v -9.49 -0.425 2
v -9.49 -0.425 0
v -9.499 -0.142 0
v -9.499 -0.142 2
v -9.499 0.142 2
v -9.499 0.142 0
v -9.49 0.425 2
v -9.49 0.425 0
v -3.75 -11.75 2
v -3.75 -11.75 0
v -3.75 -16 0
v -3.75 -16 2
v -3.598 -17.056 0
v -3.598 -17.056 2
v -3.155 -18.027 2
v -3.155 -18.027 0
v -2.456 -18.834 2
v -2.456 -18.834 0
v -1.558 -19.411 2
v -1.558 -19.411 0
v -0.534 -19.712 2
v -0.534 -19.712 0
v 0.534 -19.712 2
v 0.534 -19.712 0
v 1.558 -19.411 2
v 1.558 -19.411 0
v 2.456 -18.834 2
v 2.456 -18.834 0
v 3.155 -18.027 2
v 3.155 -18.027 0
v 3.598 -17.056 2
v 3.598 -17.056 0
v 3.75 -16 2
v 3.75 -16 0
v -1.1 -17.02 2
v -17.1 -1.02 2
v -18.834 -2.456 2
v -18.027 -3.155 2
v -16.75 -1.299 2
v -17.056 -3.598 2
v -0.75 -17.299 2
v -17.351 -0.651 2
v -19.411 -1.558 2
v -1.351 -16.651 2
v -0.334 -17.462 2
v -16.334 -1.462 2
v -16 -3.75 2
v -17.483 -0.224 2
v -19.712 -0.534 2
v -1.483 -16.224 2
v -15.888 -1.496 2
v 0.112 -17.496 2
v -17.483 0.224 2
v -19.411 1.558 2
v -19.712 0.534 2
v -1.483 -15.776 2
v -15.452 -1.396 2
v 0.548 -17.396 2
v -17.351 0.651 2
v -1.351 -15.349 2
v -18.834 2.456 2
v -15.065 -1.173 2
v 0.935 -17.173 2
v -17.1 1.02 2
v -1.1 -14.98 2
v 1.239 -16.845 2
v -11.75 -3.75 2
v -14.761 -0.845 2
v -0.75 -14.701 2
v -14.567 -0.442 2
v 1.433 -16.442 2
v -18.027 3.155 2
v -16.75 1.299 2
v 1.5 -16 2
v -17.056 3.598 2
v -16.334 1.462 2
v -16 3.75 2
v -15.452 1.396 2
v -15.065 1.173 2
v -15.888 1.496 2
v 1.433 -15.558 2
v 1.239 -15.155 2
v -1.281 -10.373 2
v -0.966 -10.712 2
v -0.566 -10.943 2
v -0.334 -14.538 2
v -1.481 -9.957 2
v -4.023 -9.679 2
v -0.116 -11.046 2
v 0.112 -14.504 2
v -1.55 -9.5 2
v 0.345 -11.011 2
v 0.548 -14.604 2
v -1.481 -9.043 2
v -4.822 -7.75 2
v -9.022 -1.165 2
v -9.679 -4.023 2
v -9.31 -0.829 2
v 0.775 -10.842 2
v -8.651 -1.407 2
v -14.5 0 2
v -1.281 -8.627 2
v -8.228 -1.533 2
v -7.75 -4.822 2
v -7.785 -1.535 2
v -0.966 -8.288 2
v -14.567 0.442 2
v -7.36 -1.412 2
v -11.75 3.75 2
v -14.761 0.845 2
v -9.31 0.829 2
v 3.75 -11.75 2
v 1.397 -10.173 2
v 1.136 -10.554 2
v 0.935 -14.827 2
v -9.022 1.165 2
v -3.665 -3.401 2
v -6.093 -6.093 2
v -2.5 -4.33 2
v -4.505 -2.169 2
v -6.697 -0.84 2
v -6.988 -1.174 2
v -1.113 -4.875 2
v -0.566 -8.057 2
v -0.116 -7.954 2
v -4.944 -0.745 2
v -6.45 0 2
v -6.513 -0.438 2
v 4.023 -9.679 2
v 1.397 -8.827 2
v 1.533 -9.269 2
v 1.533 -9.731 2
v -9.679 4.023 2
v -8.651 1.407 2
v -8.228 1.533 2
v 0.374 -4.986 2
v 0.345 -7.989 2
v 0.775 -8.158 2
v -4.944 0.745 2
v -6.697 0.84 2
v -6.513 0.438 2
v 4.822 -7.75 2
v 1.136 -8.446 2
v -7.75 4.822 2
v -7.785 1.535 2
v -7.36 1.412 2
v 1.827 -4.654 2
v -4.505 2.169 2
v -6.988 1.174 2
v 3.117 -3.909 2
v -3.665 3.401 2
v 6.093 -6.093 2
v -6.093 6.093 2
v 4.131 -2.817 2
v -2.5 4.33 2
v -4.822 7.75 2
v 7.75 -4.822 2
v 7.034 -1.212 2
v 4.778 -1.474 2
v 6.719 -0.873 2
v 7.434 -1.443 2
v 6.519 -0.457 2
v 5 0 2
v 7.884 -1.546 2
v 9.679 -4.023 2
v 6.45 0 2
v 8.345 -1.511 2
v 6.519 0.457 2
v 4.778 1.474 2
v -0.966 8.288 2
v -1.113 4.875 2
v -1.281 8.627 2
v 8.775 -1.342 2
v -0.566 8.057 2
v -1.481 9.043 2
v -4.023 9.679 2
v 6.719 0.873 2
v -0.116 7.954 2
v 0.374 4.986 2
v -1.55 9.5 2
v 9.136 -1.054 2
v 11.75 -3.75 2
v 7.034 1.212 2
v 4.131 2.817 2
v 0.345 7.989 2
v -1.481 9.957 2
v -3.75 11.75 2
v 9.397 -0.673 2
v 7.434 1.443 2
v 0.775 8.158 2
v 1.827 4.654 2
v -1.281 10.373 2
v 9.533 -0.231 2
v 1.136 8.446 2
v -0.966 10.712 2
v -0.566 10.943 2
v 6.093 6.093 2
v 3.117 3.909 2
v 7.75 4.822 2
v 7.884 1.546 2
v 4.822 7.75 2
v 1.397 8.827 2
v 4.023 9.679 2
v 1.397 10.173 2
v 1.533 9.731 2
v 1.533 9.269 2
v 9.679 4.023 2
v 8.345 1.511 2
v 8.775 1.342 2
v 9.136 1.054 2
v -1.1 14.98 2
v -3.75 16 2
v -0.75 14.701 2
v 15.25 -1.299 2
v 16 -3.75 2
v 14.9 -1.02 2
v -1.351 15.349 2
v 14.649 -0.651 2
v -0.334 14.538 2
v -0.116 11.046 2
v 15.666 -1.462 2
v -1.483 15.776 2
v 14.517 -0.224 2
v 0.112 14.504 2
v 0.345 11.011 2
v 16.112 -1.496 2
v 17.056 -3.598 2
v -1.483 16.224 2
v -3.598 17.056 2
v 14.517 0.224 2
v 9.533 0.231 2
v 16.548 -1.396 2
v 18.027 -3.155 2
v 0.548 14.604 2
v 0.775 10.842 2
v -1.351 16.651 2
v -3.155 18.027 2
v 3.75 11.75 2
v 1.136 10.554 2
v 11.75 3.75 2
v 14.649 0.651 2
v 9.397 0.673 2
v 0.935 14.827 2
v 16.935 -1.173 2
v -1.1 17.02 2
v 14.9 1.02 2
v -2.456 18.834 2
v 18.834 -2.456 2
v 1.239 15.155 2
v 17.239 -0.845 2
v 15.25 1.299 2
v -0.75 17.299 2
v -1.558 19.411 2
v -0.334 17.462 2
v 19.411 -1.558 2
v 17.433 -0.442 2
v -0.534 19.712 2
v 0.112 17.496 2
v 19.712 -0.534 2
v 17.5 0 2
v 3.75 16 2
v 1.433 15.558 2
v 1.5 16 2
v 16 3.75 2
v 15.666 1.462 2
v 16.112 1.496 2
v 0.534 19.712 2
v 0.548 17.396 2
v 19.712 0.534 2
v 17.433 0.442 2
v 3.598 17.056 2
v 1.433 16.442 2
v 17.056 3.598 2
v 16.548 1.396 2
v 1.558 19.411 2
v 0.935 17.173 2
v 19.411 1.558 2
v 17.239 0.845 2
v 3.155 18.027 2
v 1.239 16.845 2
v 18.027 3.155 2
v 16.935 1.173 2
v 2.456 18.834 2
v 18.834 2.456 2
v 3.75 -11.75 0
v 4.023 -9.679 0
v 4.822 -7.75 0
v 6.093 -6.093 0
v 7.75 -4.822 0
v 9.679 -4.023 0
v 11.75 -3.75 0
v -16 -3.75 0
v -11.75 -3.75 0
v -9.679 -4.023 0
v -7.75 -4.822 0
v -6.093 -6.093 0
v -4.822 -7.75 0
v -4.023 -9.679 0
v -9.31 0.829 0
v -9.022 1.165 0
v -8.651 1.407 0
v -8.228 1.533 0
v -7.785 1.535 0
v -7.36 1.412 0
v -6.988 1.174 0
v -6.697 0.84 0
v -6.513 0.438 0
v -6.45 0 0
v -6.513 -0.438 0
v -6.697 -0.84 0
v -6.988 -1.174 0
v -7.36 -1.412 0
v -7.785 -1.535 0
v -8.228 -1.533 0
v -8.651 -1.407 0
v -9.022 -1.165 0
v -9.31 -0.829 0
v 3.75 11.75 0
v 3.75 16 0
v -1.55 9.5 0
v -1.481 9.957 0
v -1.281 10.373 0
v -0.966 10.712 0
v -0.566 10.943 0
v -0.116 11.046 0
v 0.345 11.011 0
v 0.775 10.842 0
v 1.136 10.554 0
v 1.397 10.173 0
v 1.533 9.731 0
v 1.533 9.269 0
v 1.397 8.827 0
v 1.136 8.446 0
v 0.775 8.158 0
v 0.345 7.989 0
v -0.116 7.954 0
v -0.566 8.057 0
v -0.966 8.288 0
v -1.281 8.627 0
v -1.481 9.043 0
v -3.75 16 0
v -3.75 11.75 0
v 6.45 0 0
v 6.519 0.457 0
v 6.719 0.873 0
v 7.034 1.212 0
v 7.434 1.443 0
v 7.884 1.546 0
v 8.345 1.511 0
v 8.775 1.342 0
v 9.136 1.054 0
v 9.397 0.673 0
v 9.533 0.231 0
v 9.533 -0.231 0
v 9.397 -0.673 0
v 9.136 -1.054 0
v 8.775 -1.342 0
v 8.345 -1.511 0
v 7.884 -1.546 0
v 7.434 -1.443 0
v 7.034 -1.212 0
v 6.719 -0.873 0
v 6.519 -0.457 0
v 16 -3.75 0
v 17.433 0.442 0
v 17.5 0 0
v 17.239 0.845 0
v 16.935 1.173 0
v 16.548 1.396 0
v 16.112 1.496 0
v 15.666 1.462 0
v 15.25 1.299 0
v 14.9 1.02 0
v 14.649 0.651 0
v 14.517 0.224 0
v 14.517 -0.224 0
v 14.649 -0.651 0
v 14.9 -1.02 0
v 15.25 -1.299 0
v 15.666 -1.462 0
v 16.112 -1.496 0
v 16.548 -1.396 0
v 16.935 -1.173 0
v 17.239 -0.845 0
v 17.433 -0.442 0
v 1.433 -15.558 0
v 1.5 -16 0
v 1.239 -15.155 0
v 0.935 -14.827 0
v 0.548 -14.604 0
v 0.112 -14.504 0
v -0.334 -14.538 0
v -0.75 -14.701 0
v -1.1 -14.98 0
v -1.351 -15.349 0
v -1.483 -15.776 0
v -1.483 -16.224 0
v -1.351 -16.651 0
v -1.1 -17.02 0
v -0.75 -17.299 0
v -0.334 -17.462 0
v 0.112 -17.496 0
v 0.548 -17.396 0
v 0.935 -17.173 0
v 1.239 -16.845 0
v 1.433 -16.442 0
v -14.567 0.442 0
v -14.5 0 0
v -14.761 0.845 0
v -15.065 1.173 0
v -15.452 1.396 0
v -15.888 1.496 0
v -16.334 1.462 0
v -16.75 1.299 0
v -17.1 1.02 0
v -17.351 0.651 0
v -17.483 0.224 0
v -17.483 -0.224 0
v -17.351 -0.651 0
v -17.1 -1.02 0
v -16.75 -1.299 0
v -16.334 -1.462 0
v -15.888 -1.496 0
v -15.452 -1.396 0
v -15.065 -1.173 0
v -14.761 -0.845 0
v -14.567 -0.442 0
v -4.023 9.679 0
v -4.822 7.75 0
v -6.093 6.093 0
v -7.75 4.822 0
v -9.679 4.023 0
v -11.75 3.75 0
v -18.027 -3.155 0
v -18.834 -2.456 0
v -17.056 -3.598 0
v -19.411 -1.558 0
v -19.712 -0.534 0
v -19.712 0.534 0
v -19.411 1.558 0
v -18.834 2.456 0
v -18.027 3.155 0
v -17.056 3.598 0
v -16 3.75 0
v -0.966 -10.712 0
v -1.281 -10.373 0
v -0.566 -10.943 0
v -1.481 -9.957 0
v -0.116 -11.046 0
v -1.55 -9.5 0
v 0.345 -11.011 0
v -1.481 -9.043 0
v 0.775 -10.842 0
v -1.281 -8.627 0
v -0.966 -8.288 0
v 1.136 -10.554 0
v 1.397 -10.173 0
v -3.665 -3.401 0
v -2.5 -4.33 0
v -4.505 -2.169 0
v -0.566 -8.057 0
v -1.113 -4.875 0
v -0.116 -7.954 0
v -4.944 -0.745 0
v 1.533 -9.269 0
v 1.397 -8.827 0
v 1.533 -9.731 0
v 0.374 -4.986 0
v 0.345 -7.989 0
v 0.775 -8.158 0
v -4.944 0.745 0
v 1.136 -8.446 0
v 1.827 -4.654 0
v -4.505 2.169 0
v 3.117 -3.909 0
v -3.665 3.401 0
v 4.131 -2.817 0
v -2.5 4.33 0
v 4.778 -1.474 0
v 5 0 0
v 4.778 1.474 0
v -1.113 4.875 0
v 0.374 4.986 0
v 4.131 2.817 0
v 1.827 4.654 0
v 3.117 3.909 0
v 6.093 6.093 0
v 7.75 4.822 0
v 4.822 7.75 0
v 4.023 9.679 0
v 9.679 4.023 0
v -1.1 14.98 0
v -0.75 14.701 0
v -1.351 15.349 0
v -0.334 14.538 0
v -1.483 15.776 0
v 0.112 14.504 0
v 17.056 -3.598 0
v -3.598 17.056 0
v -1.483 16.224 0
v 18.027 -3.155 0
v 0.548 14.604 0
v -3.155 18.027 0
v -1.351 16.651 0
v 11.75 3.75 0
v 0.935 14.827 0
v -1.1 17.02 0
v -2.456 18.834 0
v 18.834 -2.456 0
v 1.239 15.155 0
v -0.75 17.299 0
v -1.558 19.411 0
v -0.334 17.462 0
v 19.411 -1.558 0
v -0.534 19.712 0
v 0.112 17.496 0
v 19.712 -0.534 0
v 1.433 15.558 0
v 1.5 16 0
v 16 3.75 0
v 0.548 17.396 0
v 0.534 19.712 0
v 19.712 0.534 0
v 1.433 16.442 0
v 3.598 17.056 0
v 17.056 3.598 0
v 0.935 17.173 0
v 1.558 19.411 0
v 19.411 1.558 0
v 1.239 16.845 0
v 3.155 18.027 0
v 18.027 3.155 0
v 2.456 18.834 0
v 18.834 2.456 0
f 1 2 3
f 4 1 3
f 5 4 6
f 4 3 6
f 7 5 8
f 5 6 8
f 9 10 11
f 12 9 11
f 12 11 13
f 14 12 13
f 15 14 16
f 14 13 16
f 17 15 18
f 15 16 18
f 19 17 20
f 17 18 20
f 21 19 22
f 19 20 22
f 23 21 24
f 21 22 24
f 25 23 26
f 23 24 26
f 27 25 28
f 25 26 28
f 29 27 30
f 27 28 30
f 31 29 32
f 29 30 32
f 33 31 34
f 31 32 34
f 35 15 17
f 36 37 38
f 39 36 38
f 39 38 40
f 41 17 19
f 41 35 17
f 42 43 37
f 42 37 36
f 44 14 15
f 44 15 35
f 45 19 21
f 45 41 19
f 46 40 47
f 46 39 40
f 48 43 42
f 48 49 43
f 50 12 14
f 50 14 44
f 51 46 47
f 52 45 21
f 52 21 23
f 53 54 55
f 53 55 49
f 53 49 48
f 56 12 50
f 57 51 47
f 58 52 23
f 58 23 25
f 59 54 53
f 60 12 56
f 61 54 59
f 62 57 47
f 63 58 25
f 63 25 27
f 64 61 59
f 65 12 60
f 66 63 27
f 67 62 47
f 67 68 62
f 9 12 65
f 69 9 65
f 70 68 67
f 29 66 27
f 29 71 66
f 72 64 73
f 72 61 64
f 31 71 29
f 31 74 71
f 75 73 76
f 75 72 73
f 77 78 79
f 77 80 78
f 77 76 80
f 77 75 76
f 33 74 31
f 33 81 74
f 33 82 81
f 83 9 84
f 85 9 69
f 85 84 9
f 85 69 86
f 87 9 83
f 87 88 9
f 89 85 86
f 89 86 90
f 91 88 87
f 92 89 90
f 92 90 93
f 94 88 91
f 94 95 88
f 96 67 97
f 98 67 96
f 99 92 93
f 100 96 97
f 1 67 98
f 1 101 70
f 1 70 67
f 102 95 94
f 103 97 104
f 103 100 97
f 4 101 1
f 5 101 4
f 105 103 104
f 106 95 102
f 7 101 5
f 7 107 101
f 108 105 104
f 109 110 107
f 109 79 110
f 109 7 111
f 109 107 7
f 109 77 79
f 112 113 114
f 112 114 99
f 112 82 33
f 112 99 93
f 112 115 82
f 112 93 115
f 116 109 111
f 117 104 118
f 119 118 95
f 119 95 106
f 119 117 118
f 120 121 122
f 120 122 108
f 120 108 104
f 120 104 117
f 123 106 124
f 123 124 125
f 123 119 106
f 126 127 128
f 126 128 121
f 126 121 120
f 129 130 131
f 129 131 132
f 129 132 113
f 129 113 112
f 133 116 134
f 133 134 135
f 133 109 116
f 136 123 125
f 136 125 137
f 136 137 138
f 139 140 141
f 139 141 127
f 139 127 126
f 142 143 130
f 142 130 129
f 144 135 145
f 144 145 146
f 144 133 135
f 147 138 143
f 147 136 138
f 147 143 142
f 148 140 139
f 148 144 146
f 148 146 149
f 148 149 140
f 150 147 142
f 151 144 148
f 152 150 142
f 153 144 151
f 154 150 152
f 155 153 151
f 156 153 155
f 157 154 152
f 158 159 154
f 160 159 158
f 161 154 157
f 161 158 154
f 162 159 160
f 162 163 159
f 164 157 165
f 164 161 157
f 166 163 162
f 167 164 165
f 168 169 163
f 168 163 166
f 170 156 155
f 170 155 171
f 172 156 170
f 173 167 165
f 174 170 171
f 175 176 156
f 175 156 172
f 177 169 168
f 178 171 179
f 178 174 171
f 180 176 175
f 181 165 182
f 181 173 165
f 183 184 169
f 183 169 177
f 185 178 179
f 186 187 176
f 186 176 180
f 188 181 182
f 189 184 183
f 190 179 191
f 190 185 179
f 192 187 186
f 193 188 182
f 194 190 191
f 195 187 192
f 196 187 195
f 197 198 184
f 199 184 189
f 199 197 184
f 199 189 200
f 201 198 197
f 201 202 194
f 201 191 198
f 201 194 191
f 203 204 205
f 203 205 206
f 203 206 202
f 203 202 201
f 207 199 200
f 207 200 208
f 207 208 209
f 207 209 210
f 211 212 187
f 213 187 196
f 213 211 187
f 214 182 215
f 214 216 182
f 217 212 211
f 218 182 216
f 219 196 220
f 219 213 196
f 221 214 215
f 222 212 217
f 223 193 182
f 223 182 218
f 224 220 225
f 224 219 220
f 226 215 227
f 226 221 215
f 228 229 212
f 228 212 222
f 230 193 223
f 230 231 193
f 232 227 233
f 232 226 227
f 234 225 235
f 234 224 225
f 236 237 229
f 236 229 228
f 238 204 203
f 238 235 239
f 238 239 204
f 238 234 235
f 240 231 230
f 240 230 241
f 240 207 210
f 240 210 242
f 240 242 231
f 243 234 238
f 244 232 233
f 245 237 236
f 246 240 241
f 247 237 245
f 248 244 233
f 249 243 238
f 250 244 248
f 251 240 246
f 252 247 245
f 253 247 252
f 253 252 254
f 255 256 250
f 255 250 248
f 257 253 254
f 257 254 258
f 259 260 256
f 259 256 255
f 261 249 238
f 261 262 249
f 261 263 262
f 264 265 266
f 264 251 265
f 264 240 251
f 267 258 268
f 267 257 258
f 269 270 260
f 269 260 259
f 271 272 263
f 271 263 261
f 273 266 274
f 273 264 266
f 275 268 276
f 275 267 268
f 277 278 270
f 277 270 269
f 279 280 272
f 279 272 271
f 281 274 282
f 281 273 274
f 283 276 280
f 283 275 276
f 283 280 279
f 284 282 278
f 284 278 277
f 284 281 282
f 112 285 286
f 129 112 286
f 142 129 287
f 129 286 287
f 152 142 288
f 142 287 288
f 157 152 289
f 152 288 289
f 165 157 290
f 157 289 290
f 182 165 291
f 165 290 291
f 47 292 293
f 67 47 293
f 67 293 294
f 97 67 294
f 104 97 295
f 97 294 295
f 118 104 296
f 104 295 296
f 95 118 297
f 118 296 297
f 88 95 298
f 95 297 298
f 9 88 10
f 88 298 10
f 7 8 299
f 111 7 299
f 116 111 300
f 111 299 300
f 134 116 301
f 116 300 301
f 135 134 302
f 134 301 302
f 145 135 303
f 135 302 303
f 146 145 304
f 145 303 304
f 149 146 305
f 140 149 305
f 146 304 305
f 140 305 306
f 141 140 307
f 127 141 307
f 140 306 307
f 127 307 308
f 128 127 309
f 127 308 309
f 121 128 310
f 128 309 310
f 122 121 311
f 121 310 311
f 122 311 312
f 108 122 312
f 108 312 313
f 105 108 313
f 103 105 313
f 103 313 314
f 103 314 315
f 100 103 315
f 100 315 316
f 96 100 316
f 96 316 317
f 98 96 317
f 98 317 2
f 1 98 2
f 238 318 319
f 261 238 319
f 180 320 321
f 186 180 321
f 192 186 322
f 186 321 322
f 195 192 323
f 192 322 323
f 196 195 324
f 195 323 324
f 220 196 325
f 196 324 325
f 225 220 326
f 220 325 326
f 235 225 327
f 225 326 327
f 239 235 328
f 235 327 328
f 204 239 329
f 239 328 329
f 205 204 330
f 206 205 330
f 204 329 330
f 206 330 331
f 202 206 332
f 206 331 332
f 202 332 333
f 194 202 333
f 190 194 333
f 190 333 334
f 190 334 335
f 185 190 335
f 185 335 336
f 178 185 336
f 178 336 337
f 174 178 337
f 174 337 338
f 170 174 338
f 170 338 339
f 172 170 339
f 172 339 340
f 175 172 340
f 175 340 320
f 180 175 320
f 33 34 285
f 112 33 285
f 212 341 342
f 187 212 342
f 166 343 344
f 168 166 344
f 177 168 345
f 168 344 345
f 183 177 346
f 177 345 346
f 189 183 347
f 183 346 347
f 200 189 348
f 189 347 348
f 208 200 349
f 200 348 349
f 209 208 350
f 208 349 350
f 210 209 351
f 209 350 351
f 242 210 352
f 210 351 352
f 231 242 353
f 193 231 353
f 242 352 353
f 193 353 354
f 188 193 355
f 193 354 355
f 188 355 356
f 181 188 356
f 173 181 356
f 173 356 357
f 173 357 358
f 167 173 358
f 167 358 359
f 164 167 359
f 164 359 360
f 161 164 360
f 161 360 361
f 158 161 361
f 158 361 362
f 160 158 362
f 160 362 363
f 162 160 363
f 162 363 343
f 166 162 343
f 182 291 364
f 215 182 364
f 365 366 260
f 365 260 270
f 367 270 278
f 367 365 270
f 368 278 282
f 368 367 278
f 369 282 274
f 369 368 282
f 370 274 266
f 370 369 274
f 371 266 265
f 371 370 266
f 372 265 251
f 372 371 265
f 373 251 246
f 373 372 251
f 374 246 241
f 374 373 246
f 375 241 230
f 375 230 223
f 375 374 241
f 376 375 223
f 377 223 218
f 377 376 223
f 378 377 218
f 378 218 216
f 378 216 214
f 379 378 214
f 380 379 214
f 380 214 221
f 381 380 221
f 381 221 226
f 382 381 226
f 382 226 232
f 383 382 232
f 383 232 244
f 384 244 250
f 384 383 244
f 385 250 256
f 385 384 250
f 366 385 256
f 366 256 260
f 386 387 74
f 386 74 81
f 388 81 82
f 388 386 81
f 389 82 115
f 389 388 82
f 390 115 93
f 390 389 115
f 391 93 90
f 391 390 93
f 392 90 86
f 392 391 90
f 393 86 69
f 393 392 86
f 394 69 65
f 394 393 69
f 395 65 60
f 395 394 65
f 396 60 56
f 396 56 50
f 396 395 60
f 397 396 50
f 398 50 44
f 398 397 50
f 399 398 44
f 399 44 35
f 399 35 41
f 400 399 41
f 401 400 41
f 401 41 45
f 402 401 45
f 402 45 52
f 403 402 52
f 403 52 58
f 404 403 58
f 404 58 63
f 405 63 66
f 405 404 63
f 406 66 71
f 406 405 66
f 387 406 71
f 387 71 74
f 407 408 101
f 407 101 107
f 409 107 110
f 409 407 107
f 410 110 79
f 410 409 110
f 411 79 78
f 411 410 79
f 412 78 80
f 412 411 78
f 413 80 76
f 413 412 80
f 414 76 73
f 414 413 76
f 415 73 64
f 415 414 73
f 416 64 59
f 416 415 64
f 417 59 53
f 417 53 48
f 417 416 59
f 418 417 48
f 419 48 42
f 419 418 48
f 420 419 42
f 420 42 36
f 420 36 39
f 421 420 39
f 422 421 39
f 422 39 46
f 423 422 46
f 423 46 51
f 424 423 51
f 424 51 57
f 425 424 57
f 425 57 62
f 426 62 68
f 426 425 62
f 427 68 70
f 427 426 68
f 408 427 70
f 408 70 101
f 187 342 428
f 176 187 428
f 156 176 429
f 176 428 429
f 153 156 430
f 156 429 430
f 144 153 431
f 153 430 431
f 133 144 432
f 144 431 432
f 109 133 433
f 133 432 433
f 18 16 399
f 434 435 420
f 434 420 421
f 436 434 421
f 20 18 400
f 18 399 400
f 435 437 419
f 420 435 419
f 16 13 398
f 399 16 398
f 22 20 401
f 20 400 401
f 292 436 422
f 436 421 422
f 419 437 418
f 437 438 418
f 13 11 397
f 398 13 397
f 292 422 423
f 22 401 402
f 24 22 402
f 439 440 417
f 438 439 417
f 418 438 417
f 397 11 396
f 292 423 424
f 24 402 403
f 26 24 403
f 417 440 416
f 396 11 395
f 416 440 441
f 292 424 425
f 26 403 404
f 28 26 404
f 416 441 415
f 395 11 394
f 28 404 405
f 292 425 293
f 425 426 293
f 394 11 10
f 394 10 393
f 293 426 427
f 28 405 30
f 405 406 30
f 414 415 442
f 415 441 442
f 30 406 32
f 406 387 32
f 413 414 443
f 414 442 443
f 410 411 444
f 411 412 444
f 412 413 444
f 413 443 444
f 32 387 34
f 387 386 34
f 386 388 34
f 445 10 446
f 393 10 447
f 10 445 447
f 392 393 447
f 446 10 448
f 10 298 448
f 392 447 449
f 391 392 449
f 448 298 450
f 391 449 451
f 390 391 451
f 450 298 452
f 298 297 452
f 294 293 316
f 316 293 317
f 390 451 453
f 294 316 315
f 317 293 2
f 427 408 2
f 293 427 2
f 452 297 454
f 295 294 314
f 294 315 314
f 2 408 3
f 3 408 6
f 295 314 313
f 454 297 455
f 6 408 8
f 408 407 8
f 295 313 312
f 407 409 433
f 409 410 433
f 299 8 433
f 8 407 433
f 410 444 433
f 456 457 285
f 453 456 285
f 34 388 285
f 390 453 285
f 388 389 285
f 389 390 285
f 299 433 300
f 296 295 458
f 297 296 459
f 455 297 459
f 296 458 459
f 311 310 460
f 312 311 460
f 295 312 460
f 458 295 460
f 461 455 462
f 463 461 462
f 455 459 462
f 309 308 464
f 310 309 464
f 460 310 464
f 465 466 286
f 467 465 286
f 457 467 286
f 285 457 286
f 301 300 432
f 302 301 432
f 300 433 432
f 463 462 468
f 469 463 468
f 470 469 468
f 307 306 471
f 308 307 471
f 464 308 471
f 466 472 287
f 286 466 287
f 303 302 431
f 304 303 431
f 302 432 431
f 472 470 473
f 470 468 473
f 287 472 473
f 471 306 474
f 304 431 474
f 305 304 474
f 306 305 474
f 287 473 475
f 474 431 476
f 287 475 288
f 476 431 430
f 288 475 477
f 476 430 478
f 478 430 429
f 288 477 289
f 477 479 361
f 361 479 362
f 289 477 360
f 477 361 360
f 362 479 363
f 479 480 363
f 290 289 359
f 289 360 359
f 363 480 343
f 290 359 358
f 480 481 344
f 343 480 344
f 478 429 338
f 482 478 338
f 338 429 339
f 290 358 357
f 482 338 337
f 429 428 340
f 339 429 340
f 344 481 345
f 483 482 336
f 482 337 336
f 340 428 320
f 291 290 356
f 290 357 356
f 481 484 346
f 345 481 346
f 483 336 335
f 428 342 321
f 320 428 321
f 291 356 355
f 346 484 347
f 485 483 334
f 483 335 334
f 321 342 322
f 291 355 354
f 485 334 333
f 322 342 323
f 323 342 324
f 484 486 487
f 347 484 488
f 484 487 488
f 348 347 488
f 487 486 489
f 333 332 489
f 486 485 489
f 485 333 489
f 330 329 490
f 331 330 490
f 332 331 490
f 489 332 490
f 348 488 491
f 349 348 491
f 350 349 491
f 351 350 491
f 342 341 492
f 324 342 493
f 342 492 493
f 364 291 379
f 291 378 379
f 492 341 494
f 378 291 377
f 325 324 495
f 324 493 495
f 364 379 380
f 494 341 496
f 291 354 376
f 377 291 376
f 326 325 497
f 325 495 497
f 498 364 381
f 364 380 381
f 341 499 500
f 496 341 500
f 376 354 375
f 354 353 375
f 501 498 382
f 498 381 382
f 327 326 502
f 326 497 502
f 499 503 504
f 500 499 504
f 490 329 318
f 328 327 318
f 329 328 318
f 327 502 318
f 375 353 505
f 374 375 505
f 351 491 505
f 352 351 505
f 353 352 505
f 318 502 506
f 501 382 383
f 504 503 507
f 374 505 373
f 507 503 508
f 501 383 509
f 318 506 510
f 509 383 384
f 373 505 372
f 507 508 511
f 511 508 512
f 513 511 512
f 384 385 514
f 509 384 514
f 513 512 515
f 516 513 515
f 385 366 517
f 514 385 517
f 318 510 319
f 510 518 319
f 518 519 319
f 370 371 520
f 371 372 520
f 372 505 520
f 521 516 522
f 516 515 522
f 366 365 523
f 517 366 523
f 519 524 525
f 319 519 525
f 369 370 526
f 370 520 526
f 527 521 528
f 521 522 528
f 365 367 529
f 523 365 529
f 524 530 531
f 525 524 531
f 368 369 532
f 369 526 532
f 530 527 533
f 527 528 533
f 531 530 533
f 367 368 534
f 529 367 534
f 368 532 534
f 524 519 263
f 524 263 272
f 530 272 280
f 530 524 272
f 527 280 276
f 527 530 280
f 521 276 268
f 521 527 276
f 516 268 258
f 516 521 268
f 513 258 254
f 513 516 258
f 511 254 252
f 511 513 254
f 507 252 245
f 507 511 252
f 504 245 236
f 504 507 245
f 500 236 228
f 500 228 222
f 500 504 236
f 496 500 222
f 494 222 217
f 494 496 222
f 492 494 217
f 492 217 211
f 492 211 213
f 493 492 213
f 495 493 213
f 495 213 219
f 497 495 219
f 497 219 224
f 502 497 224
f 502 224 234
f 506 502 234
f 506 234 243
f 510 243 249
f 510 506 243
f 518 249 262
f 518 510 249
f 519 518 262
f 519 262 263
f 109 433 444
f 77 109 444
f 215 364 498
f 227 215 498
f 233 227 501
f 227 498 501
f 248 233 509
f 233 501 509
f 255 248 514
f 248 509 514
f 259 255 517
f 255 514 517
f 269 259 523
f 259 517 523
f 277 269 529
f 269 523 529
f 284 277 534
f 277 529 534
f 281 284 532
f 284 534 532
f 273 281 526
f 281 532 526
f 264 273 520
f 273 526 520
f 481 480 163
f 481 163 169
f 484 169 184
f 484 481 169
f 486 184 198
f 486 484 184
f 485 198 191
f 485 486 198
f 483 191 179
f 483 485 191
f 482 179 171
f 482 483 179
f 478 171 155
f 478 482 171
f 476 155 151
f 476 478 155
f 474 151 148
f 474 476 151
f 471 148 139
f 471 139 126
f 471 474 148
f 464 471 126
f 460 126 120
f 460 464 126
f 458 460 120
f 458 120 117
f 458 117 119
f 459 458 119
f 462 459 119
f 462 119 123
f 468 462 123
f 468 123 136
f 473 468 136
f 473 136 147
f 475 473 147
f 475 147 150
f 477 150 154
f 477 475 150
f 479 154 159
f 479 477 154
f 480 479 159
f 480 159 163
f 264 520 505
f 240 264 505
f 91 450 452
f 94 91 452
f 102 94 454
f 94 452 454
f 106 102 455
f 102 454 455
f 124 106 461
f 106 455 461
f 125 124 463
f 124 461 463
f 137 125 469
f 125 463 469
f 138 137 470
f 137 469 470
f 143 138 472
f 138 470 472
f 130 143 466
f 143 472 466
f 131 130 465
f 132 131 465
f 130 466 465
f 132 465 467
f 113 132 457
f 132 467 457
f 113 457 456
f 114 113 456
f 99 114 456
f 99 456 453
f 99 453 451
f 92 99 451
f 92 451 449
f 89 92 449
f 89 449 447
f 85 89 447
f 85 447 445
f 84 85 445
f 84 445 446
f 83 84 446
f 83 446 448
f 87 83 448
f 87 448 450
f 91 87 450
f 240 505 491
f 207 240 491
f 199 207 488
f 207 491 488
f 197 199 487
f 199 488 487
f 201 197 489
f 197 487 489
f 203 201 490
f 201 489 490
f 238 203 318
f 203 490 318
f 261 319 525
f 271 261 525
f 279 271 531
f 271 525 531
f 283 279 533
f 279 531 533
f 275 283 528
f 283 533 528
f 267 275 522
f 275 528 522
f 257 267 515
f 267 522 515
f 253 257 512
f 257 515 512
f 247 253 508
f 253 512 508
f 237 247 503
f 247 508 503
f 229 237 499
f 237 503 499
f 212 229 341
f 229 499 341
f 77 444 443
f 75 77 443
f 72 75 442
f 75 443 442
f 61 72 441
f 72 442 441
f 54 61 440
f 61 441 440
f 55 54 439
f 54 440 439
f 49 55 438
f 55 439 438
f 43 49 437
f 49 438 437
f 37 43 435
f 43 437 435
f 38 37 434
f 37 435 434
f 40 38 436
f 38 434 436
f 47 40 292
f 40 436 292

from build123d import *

# Parameters (mm, degrees)
SKETCH1_R           = 5
SKETCH1_R_2         = 1.5
BOSS_EXTRUDE1_DEPTH = 2
SKETCH3_R           = 1.55
CUT_EXTRUDE1_DEPTH  = 10


with BuildPart() as part:
    # Sketch1 → Boss-Extrude1 (new body)
    with BuildSketch(Plane.XY):
        with BuildLine():
            Line((-3.75, 16), (-3.75, 11.75))
            ThreePointArc((-3.75, 11.75), (-6.093145751, 6.093145751), (-11.75, 3.75))
            Line((-11.75, 3.75), (-16, 3.75))
            ThreePointArc((-16, 3.75), (-19.75, 0), (-16, -3.75))
            Line((-16, -3.75), (-11.75, -3.75))
            ThreePointArc((-11.75, -3.75), (-6.093145751, -6.093145751), (-3.75, -11.75))
            Line((-3.75, -11.75), (-3.75, -16))
            ThreePointArc((-3.75, -16), (0, -19.75), (3.75, -16))
            Line((3.75, -16), (3.75, -11.75))
            ThreePointArc((3.75, -11.75), (6.093145751, -6.093145751), (11.75, -3.75))
            Line((11.75, -3.75), (16, -3.75))
            ThreePointArc((16, -3.75), (19.75, 0), (16, 3.75))
            Line((16, 3.75), (11.75, 3.75))
            ThreePointArc((11.75, 3.75), (6.093145751, 6.093145751), (3.75, 11.75))
            Line((3.75, 11.75), (3.75, 16))
            ThreePointArc((3.75, 16), (0, 19.75), (-3.75, 16))
        make_face()
        Circle(SKETCH1_R, mode=Mode.SUBTRACT)
        with Locations((-16, 0)):
            Circle(SKETCH1_R_2, mode=Mode.SUBTRACT)
        with Locations((0, 16)):
            Circle(SKETCH1_R_2, mode=Mode.SUBTRACT)
        with Locations((16, 0)):
            Circle(SKETCH1_R_2, mode=Mode.SUBTRACT)
        with Locations((0, -16)):
            Circle(SKETCH1_R_2, mode=Mode.SUBTRACT)
    extrude(amount=BOSS_EXTRUDE1_DEPTH)

    # Sketch3 → Cut-Extrude1 (cut)
    with BuildSketch(Plane(origin=(0, 0, 0), x_dir=(-1, 0, 0), z_dir=(0, 0, -1))):
        with BuildLine():
            ThreePointArc((9.49046875, -0.425444362), (9.5, 0), (9.49046875, 0.425444362))
            ThreePointArc((9.49046875, 0.425444362), (6.45, 0), (9.49046875, -0.425444362))
        make_face()
        with Locations((0, 9.5)):
            Circle(SKETCH3_R)
        with Locations((0, -9.5)):
            Circle(SKETCH3_R)
        with Locations((-8, 0)):
            Circle(SKETCH3_R)
    extrude(amount=-CUT_EXTRUDE1_DEPTH, mode=Mode.SUBTRACT)


solid = part.part
